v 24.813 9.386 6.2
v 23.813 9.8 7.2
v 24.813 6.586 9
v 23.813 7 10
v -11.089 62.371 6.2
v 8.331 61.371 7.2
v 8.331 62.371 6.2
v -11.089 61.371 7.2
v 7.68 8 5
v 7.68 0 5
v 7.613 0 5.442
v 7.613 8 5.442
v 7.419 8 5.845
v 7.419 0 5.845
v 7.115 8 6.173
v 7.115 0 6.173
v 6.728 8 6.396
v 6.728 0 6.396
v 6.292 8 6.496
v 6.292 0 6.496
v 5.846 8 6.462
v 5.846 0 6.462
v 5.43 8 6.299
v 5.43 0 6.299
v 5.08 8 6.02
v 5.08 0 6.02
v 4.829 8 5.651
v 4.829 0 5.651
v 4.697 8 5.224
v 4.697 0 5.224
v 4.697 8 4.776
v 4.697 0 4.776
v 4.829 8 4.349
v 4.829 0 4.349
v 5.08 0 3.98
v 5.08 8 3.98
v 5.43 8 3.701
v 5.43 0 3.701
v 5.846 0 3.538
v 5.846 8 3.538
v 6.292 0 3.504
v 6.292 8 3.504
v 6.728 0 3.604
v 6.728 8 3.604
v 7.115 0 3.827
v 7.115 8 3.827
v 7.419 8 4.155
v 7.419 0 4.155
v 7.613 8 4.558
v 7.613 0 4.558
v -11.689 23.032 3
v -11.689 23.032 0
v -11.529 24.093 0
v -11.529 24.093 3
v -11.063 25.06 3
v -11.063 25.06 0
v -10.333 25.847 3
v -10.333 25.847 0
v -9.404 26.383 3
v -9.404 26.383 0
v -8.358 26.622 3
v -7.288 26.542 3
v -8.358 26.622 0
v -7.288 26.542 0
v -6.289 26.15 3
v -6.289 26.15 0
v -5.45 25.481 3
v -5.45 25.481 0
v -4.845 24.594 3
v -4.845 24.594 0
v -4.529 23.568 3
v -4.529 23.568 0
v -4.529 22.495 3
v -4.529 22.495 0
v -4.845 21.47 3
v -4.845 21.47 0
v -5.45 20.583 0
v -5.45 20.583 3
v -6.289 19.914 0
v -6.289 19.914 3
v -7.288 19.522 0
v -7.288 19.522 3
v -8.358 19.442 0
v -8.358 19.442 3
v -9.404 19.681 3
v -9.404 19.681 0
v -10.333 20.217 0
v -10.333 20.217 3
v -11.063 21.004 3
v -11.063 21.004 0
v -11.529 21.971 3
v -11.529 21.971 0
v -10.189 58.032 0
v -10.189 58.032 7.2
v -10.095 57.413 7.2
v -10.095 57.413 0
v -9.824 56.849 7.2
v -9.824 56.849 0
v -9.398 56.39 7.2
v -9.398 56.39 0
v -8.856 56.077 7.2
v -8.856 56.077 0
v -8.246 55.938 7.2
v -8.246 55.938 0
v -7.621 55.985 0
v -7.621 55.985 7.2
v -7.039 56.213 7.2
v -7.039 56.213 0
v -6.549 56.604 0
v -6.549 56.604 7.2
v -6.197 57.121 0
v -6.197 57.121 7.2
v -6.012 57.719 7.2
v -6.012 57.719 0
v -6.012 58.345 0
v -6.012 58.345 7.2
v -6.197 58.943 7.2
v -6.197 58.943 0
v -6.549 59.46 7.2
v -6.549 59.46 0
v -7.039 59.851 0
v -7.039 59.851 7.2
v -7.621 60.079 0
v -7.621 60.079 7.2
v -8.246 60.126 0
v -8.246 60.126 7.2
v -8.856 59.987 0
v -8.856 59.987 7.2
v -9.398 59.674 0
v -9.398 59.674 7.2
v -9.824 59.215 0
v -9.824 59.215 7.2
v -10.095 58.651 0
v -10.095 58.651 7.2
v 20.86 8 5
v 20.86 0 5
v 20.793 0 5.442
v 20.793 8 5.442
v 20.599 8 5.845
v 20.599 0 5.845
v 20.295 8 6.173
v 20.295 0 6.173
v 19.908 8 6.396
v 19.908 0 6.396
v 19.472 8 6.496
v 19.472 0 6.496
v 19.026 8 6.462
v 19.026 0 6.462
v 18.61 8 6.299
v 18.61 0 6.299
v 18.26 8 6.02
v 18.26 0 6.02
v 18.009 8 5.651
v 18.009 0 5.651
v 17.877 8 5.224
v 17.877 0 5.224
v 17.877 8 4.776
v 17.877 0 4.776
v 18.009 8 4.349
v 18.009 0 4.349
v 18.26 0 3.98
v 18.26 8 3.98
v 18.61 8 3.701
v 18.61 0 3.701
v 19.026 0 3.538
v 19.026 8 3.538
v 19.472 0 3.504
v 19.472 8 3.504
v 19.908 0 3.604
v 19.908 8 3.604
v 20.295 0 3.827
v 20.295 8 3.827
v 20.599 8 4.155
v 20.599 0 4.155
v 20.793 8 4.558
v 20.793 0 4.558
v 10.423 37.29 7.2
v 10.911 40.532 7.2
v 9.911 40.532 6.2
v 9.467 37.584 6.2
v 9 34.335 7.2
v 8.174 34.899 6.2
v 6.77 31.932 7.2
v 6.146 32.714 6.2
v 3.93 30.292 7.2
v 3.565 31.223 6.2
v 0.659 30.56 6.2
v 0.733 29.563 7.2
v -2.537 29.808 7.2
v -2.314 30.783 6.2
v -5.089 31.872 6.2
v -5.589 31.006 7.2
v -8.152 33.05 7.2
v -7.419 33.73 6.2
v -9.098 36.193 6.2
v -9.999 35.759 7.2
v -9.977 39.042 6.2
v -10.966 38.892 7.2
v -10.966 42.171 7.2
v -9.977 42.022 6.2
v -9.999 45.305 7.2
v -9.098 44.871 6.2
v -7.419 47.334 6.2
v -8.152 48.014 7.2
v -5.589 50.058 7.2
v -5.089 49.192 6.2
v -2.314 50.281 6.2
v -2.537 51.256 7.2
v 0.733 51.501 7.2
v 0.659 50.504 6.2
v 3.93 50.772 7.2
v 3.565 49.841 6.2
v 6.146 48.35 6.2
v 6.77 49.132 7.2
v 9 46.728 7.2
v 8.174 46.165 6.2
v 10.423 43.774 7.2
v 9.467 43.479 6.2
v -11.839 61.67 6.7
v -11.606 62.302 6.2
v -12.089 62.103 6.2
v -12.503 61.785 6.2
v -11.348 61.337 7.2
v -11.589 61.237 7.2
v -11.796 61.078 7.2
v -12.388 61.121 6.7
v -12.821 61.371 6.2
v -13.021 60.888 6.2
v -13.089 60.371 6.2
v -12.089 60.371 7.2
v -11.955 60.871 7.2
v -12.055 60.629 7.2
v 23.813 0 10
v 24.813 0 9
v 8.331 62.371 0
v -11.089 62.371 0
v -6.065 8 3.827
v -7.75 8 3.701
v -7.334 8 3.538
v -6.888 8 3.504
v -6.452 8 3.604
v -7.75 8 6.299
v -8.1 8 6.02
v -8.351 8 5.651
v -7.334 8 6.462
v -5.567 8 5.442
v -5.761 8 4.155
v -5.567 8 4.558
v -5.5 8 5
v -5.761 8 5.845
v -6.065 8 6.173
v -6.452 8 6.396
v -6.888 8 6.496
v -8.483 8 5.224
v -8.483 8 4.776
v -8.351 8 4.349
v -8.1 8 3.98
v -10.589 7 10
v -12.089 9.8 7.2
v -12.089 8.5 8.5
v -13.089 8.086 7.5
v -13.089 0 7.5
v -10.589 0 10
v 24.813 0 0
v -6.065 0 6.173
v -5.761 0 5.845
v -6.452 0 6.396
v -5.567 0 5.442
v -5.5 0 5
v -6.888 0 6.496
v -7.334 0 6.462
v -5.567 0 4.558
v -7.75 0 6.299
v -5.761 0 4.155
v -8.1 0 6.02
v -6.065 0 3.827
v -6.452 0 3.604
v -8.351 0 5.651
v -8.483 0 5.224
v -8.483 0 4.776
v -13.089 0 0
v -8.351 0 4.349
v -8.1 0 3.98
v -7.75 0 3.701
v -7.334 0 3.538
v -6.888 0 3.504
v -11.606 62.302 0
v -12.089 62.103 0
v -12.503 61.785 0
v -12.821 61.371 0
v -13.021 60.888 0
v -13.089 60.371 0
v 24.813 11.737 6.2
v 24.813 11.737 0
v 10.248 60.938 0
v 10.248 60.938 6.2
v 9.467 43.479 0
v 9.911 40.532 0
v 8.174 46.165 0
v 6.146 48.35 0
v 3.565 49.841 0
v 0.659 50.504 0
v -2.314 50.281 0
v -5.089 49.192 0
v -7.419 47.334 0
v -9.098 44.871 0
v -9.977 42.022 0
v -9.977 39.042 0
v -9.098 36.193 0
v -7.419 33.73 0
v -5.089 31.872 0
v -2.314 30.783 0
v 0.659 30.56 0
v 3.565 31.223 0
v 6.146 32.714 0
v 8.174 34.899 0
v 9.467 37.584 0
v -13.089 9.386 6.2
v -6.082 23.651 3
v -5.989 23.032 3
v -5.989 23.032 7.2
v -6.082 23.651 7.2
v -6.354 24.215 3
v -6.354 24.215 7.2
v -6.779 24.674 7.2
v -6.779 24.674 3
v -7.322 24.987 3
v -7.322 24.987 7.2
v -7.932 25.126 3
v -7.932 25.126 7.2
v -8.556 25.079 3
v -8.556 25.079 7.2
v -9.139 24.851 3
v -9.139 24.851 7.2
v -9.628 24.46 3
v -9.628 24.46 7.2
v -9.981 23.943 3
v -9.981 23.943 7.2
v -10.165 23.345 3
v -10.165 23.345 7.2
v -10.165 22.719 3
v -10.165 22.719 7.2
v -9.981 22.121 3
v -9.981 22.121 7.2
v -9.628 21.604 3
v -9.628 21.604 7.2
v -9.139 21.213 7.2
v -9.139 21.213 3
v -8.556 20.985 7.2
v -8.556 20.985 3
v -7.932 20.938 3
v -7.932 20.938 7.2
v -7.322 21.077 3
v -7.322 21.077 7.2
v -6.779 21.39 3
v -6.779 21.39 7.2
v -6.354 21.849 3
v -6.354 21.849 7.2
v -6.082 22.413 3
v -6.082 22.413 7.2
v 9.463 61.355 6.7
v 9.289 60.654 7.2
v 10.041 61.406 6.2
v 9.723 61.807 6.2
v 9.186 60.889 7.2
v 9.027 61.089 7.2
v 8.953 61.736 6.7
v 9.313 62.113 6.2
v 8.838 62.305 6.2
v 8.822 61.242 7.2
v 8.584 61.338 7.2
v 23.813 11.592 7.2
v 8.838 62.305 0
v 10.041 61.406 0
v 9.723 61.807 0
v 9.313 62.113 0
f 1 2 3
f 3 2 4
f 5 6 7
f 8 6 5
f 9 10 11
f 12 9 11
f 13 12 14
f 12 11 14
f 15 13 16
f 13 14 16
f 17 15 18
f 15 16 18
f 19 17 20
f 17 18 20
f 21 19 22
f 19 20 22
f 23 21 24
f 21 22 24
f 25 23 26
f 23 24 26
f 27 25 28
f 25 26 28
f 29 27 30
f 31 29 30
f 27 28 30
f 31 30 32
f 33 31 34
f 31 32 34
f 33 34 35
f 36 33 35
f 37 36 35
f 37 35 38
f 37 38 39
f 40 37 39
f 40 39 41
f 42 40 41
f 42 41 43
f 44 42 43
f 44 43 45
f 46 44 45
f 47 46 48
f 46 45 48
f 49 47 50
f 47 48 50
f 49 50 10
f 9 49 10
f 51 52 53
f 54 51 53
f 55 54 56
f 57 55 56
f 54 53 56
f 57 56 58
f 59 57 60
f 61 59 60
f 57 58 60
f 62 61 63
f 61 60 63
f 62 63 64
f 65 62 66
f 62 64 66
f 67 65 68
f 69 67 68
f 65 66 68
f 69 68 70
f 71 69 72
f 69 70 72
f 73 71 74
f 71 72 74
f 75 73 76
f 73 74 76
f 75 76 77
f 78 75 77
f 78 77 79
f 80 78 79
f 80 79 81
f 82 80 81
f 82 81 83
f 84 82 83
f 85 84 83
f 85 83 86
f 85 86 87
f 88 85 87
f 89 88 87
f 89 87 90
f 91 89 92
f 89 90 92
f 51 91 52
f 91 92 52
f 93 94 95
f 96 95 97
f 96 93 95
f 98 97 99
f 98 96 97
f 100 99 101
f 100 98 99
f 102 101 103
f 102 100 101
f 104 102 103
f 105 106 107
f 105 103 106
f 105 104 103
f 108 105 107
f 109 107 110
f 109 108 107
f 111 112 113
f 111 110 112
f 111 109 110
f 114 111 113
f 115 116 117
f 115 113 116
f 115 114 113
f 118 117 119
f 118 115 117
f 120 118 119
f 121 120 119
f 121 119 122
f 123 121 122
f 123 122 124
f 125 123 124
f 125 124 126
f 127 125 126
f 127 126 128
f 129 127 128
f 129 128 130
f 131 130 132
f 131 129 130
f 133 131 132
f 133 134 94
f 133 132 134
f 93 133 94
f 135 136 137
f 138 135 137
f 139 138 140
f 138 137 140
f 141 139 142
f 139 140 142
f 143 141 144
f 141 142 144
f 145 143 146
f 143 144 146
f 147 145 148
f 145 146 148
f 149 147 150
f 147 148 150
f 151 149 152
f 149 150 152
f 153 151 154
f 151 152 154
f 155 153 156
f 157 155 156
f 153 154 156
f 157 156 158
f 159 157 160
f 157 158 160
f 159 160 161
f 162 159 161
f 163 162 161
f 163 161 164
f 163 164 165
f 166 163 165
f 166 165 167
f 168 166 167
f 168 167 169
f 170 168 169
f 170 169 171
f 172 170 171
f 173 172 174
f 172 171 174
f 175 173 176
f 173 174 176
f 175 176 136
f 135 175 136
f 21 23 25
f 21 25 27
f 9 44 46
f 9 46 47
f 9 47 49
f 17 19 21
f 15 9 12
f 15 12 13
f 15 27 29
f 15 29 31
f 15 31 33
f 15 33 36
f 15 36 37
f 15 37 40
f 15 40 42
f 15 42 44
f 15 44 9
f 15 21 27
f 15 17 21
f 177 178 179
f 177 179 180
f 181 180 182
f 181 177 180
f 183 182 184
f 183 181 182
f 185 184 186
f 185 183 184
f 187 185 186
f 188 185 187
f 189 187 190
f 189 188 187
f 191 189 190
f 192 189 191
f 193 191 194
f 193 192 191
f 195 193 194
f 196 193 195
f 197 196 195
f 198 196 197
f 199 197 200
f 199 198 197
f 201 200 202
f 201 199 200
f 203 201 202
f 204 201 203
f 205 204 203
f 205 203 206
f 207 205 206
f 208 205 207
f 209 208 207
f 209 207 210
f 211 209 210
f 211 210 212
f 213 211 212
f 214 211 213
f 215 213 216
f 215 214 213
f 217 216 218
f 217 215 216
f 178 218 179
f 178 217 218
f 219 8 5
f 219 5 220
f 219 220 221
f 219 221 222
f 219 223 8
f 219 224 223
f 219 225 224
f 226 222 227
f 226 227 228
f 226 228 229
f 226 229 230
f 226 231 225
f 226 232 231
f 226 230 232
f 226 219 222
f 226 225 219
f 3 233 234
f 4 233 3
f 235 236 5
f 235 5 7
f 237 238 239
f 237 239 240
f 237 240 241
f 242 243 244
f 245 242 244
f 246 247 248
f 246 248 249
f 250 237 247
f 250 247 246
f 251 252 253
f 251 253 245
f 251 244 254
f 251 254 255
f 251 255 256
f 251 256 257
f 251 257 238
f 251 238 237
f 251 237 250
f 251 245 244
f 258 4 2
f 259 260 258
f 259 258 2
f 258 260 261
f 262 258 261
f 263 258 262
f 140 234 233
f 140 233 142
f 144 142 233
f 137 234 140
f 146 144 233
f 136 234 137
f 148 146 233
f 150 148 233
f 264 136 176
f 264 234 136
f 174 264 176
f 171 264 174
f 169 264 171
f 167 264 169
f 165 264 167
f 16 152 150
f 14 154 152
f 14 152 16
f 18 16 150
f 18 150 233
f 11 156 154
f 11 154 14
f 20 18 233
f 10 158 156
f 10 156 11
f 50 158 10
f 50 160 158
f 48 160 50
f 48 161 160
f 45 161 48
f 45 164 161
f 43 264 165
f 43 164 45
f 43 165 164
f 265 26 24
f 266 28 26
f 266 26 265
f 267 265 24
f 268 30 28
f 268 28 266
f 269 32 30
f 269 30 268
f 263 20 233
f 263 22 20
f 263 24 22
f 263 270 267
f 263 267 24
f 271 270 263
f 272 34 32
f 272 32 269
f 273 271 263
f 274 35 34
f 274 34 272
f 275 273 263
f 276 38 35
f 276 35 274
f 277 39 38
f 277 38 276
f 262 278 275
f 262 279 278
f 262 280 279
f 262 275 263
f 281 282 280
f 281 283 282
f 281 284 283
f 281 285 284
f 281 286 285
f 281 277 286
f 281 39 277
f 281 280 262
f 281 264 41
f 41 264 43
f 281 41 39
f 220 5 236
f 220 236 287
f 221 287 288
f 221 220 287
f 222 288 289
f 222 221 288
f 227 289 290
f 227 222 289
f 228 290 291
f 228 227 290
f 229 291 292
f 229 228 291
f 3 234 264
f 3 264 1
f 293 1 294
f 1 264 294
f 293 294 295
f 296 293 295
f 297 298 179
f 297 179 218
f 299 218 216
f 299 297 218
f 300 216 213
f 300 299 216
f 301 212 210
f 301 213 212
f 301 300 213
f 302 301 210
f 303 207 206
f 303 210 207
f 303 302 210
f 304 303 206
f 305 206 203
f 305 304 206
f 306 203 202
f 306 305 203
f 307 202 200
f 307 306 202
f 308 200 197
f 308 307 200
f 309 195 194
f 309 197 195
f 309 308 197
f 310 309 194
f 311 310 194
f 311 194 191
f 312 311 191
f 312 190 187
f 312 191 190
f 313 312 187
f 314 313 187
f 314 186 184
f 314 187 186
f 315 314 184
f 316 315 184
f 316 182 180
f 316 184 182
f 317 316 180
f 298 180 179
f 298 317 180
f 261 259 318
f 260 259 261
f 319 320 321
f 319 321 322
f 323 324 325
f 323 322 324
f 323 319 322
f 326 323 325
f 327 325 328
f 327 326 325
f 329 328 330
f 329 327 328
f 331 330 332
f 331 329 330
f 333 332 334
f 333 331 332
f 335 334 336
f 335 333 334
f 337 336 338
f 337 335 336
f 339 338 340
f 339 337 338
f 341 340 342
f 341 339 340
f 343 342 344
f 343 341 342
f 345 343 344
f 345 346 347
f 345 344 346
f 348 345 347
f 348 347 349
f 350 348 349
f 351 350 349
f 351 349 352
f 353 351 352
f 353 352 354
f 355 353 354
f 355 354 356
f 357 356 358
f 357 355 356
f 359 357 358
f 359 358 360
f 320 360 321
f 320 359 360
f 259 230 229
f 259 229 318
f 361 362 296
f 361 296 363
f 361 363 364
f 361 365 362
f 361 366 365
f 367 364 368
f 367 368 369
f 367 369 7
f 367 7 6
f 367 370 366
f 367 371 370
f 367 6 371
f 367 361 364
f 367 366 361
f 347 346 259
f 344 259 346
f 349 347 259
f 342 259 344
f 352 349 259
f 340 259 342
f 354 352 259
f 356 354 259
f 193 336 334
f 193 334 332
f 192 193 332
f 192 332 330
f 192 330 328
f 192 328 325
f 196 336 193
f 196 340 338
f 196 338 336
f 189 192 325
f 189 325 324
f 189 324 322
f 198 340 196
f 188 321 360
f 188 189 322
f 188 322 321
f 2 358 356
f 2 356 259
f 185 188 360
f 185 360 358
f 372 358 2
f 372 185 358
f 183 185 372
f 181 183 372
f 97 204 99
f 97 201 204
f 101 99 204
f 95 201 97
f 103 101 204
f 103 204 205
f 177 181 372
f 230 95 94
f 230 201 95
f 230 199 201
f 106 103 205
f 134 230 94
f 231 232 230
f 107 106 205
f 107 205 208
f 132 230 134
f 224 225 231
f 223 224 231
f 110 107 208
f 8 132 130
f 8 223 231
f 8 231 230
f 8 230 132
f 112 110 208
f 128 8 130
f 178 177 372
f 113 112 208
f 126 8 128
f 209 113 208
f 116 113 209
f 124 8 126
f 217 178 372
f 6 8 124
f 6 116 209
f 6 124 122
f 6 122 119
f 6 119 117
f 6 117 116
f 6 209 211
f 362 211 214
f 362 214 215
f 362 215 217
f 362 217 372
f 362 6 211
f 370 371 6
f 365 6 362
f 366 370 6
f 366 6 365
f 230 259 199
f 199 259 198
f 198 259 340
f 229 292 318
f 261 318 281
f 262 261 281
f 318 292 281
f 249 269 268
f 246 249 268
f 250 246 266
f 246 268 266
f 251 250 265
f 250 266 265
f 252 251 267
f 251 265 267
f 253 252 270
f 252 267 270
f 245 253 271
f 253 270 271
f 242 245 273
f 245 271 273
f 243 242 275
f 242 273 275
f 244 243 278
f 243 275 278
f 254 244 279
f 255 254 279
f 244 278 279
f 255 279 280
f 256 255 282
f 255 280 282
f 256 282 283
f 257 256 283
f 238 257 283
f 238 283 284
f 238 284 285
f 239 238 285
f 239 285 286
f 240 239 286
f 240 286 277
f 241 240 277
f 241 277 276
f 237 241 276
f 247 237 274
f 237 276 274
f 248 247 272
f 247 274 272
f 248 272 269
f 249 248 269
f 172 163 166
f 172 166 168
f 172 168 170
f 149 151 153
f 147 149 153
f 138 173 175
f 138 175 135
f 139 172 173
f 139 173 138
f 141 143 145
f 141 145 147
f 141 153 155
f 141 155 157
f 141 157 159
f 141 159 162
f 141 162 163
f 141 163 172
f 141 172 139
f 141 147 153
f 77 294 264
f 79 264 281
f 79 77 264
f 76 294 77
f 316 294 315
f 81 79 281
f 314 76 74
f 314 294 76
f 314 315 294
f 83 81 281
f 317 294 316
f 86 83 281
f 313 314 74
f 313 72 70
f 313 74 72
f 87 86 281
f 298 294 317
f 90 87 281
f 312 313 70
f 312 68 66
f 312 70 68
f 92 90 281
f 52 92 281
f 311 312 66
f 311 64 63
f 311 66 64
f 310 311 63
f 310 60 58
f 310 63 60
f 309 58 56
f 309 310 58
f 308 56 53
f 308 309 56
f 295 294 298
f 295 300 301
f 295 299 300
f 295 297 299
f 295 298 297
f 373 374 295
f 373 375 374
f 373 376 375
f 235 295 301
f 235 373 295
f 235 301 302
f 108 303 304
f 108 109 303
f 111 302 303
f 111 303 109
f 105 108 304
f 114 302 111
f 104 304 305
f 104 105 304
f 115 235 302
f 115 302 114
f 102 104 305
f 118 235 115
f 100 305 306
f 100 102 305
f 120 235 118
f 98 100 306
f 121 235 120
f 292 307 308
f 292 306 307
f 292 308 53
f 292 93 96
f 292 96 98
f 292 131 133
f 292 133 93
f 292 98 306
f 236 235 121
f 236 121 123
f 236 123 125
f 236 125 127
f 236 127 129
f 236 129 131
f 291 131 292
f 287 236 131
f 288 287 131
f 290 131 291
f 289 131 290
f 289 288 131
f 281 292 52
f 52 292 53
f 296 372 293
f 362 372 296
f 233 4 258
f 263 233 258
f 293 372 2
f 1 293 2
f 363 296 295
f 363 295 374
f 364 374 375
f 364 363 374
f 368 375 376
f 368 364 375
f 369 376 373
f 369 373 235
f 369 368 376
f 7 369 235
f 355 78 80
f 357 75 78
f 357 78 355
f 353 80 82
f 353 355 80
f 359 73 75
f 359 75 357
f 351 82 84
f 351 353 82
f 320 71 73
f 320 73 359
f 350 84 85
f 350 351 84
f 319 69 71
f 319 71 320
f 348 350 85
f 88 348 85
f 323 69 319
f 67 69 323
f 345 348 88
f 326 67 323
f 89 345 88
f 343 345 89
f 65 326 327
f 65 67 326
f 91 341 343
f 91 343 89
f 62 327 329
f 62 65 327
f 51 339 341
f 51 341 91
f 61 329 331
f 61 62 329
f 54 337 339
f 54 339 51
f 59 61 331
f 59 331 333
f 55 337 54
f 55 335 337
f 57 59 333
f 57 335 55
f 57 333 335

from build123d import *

# Parameters (mm, degrees)
SKIZZE1_R                            = 2.1
AUFSATZ_LINEAR_AUSTRAGEN1_DEPTH      = 10
SKIZZE2_R                            = 1.5
SCHNITT_LINEAR_AUSTRAGEN1_DEPTH      = 8
SCHNITT_LINEAR_AUSTRAGEN3_DEPTH      = 2.8
SCHNITT_LINEAR_AUSTRAGEN5_DEPTH      = 69.862823313
SCHNITT_LINEAR_AUSTRAGEN5_DEPTH_BACK = 69.862823313
SKIZZE7_R                            = 10
FASE1_SIZE                           = 3
SCHNITT_LINEAR_AUSTRAGEN4_DEPTH      = 10
VERRUNDUNG1_R                        = 2
FASE2_SIZE                           = 1
FASE3_SIZE                           = 2.5
SKIZZE8_R                            = 3.6
SCHNITT_LINEAR_AUSTRAGEN6_DEPTH      = 3


with BuildPart() as part:
    # Skizze1 → Aufsatz-Linear austragen1 (new body)
    with BuildSketch(Plane.XY):
        Polygon((28.287001282, 57.370618027), (28.287001282, 0), (-13.088781156, 0), (-13.088781156, 27.348243657), (-13.088781156, 53.715647777), (-13.088781156, 57.370618027), (-13.088781156, 62.370618027), (28.287001282, 62.370618027), align=None)
        with Locations((-8.088781156, 23.031945717)):
            Circle(SKIZZE1_R, mode=Mode.SUBTRACT)
        with Locations(Location((-8.088781156, 58.031945717, 0), (0, 0, 180))):
            Circle(SKIZZE1_R, mode=Mode.SUBTRACT)
    extrude(amount=AUFSATZ_LINEAR_AUSTRAGEN1_DEPTH)

    # Skizze2 → Schnitt-Linear austragen1 (cut)
    with BuildSketch(Plane.XZ):
        with Locations((-7, 5)):
            Circle(SKIZZE2_R)
        with Locations((6.18, 5)):
            Circle(SKIZZE2_R)
        with Locations((19.36, 5)):
            Circle(SKIZZE2_R)
    extrude(amount=-SCHNITT_LINEAR_AUSTRAGEN1_DEPTH, mode=Mode.SUBTRACT)

    # Skizze4 → Schnitt-Linear austragen3 (cut)
    with BuildSketch(Plane.XY.offset(10)):
        Polygon((-15.095168359, 10), (28.287001282, 10), (36.093332102, 46.989971623), (30.429094825, 65.957451721), (-16.081030445, 65.957451721), (-16.081030445, 27.753515123), align=None)
    extrude(amount=-SCHNITT_LINEAR_AUSTRAGEN3_DEPTH, mode=Mode.SUBTRACT)

    # Skizze7 → Schnitt-Linear austragen5 (cut, two sides: drawn at the far end of the back side and taken through both)
    with BuildSketch(Plane.XY.offset(7.2).offset(-SCHNITT_LINEAR_AUSTRAGEN5_DEPTH_BACK)):
        with Locations((-0.088781156, 40.531945717)):
            Circle(SKIZZE7_R)
    extrude(amount=SCHNITT_LINEAR_AUSTRAGEN5_DEPTH + SCHNITT_LINEAR_AUSTRAGEN5_DEPTH_BACK, mode=Mode.SUBTRACT)

    # Fase1
    # the kernel refuses this chamfer: 3 mm, written as the material it takes off along each edge
    with BuildSketch(Plane(origin=(-20.80383012, 10, 10), x_dir=(0, -0.9996219169112969, 0.027495876610586202), z_dir=(1, 0, 0))) as fase1_piece_1_section:
        Polygon((FASE1_SIZE * 0.999621916911, FASE1_SIZE * 0.0274958766106), (-FASE1_SIZE * 0.0274958766106, FASE1_SIZE * 0.999621916911), (0, 0), align=None)
    fase1_piece_1 = extrude(amount=56.805880365, mode=Mode.PRIVATE)
    fase1_piece_1 = split(fase1_piece_1, bisect_by=Plane(origin=(7.599110063, 8.999392985, 7.2), z_dir=(0, 0, 1)), keep=Keep.TOP, mode=Mode.PRIVATE)
    add(fase1_piece_1, mode=Mode.SUBTRACT)

    # Skizze5 → Schnitt-Linear austragen4 (cut)
    with BuildSketch(Plane(origin=(0, 0, 0), x_dir=(-1, 0, 0), z_dir=(0, 0, -1))):
        Polygon((-24.81273389, 11.736777957), (-9.824335871, 62.370618027), (-28.287001282, 62.370618027), (-28.287001282, 0), (-24.81273389, 0), align=None)
    extrude(amount=-SCHNITT_LINEAR_AUSTRAGEN4_DEPTH, mode=Mode.SUBTRACT)

    # Verrundung1
    verrundung1_edges = [part.edges().sort_by_distance(p)[0] for p in [
        (9.824335871, 62.370618027, 3.6),
        (-13.088781156, 62.370618027, 3.6),
    ]]
    fillet(verrundung1_edges, radius=VERRUNDUNG1_R)

    # Fase2
    fase2_edges = [part.edges().sort_by_distance(p)[0] for p in [
        (24.81273389, 10.768388979, 7.2),
        (24.81273389, 3.5, 10),
        (-13.088781156, 35.085309014, 7.2),
        (-1.379099888, 62.370618027, 7.2),
        (17.530529072, 36.337538735, 7.2),
        (9.527376482, 61.973016693, 7.2),
        (-12.502994718, 61.78483159, 7.2),
        (-10.088781156, 40.531945717, 7.2),
        (-13.088781156, 8.4, 8.6),
        (24.81273389, 8.4, 8.6),
    ]]
    chamfer(fase2_edges, length=FASE2_SIZE)

    # Fase3
    fase3_edges = [part.edges().sort_by_distance(p)[0] for p in [
        (-13.088781156, 2.792893219, 10),
    ]]
    chamfer(fase3_edges, length=FASE3_SIZE)

    # Skizze8 → Schnitt-Linear austragen6 (cut)
    with BuildSketch(Plane(origin=(0, 0, 0), x_dir=(-1, 0, 0), z_dir=(0, 0, -1))):
        with Locations((8.088781156, 23.031945717)):
            Circle(SKIZZE8_R)
    extrude(amount=-SCHNITT_LINEAR_AUSTRAGEN6_DEPTH, mode=Mode.SUBTRACT)


solid = part.part
